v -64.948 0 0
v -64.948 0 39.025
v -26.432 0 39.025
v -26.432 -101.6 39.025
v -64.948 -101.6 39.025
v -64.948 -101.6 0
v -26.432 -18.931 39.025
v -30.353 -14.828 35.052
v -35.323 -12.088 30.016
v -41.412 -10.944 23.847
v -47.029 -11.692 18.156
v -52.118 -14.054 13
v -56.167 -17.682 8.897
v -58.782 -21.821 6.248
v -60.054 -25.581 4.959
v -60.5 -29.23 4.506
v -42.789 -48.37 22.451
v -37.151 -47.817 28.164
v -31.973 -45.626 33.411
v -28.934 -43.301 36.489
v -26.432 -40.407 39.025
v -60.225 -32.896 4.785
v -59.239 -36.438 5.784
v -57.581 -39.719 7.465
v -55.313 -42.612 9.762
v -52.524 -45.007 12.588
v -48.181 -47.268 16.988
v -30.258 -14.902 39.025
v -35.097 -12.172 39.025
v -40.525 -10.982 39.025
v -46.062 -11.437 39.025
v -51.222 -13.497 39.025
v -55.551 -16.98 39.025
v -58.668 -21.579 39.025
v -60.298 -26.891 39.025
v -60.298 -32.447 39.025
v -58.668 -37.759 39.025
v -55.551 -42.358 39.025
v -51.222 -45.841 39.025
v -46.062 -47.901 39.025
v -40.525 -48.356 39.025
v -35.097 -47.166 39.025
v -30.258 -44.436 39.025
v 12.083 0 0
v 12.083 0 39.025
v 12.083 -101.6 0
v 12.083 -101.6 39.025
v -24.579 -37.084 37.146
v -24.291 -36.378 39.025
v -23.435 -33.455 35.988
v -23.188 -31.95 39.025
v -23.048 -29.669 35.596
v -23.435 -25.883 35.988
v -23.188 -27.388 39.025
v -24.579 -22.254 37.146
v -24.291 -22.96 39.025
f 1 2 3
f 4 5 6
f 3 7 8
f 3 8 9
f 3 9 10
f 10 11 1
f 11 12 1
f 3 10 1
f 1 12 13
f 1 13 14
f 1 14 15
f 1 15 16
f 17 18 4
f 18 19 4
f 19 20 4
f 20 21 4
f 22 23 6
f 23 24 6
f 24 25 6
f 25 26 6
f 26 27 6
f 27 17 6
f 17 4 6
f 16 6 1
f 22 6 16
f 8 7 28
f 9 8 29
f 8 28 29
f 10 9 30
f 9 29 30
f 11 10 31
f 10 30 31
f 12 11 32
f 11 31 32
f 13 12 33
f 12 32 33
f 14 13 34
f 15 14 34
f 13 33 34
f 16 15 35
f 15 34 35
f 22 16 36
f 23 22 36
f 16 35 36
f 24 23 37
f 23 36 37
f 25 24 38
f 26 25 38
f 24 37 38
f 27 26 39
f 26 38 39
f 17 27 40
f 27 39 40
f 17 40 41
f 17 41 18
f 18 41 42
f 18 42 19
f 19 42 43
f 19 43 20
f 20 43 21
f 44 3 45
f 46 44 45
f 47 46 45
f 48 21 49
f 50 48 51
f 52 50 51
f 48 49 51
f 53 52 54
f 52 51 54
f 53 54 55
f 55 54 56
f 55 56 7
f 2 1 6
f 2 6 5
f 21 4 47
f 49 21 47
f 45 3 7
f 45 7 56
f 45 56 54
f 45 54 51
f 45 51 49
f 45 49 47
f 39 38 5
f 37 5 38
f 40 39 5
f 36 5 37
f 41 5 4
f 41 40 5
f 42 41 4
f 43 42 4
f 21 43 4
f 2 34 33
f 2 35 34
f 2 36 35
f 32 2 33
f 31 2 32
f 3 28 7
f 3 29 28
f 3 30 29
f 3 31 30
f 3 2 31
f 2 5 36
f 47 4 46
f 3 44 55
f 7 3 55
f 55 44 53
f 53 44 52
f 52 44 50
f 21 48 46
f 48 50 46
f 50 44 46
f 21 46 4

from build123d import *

# Parameters (mm, degrees)
F0_W     = 77.0312082022
F0_H     = 39.0245728195
F1_DEPTH = 101.6
F2_R     = 18.7285451054
F3_DEPTH = 39.0255728195
F5_DEPTH = 101.601


with BuildPart() as f1:
    # F0 (on Front) → F1 (new body)
    with BuildSketch(Plane.XZ):
        with Locations((-26.4322767034, 19.5122864097)):
            Rectangle(F0_W, F0_H)
    extrude(amount=F1_DEPTH)

    # F2 (on face) → F3 (cut, through all)
    with BuildSketch(Plane.XY.offset(39.0245728195)):
        with Locations((-41.7767949402, -29.6690277755)):
            Circle(F2_R)
    extrude(amount=-F3_DEPTH, mode=Mode.SUBTRACT)

    # F4 (on face) → F5 (cut, through all)
    with BuildSketch(Plane.XZ.offset(101.6)):
        Polygon((-26.4322767034, 39.0245728195), (-64.9478808045, 0), (12.0833273977, 0), align=None)
    extrude(amount=-F5_DEPTH, mode=Mode.SUBTRACT)


solid = f1.part
